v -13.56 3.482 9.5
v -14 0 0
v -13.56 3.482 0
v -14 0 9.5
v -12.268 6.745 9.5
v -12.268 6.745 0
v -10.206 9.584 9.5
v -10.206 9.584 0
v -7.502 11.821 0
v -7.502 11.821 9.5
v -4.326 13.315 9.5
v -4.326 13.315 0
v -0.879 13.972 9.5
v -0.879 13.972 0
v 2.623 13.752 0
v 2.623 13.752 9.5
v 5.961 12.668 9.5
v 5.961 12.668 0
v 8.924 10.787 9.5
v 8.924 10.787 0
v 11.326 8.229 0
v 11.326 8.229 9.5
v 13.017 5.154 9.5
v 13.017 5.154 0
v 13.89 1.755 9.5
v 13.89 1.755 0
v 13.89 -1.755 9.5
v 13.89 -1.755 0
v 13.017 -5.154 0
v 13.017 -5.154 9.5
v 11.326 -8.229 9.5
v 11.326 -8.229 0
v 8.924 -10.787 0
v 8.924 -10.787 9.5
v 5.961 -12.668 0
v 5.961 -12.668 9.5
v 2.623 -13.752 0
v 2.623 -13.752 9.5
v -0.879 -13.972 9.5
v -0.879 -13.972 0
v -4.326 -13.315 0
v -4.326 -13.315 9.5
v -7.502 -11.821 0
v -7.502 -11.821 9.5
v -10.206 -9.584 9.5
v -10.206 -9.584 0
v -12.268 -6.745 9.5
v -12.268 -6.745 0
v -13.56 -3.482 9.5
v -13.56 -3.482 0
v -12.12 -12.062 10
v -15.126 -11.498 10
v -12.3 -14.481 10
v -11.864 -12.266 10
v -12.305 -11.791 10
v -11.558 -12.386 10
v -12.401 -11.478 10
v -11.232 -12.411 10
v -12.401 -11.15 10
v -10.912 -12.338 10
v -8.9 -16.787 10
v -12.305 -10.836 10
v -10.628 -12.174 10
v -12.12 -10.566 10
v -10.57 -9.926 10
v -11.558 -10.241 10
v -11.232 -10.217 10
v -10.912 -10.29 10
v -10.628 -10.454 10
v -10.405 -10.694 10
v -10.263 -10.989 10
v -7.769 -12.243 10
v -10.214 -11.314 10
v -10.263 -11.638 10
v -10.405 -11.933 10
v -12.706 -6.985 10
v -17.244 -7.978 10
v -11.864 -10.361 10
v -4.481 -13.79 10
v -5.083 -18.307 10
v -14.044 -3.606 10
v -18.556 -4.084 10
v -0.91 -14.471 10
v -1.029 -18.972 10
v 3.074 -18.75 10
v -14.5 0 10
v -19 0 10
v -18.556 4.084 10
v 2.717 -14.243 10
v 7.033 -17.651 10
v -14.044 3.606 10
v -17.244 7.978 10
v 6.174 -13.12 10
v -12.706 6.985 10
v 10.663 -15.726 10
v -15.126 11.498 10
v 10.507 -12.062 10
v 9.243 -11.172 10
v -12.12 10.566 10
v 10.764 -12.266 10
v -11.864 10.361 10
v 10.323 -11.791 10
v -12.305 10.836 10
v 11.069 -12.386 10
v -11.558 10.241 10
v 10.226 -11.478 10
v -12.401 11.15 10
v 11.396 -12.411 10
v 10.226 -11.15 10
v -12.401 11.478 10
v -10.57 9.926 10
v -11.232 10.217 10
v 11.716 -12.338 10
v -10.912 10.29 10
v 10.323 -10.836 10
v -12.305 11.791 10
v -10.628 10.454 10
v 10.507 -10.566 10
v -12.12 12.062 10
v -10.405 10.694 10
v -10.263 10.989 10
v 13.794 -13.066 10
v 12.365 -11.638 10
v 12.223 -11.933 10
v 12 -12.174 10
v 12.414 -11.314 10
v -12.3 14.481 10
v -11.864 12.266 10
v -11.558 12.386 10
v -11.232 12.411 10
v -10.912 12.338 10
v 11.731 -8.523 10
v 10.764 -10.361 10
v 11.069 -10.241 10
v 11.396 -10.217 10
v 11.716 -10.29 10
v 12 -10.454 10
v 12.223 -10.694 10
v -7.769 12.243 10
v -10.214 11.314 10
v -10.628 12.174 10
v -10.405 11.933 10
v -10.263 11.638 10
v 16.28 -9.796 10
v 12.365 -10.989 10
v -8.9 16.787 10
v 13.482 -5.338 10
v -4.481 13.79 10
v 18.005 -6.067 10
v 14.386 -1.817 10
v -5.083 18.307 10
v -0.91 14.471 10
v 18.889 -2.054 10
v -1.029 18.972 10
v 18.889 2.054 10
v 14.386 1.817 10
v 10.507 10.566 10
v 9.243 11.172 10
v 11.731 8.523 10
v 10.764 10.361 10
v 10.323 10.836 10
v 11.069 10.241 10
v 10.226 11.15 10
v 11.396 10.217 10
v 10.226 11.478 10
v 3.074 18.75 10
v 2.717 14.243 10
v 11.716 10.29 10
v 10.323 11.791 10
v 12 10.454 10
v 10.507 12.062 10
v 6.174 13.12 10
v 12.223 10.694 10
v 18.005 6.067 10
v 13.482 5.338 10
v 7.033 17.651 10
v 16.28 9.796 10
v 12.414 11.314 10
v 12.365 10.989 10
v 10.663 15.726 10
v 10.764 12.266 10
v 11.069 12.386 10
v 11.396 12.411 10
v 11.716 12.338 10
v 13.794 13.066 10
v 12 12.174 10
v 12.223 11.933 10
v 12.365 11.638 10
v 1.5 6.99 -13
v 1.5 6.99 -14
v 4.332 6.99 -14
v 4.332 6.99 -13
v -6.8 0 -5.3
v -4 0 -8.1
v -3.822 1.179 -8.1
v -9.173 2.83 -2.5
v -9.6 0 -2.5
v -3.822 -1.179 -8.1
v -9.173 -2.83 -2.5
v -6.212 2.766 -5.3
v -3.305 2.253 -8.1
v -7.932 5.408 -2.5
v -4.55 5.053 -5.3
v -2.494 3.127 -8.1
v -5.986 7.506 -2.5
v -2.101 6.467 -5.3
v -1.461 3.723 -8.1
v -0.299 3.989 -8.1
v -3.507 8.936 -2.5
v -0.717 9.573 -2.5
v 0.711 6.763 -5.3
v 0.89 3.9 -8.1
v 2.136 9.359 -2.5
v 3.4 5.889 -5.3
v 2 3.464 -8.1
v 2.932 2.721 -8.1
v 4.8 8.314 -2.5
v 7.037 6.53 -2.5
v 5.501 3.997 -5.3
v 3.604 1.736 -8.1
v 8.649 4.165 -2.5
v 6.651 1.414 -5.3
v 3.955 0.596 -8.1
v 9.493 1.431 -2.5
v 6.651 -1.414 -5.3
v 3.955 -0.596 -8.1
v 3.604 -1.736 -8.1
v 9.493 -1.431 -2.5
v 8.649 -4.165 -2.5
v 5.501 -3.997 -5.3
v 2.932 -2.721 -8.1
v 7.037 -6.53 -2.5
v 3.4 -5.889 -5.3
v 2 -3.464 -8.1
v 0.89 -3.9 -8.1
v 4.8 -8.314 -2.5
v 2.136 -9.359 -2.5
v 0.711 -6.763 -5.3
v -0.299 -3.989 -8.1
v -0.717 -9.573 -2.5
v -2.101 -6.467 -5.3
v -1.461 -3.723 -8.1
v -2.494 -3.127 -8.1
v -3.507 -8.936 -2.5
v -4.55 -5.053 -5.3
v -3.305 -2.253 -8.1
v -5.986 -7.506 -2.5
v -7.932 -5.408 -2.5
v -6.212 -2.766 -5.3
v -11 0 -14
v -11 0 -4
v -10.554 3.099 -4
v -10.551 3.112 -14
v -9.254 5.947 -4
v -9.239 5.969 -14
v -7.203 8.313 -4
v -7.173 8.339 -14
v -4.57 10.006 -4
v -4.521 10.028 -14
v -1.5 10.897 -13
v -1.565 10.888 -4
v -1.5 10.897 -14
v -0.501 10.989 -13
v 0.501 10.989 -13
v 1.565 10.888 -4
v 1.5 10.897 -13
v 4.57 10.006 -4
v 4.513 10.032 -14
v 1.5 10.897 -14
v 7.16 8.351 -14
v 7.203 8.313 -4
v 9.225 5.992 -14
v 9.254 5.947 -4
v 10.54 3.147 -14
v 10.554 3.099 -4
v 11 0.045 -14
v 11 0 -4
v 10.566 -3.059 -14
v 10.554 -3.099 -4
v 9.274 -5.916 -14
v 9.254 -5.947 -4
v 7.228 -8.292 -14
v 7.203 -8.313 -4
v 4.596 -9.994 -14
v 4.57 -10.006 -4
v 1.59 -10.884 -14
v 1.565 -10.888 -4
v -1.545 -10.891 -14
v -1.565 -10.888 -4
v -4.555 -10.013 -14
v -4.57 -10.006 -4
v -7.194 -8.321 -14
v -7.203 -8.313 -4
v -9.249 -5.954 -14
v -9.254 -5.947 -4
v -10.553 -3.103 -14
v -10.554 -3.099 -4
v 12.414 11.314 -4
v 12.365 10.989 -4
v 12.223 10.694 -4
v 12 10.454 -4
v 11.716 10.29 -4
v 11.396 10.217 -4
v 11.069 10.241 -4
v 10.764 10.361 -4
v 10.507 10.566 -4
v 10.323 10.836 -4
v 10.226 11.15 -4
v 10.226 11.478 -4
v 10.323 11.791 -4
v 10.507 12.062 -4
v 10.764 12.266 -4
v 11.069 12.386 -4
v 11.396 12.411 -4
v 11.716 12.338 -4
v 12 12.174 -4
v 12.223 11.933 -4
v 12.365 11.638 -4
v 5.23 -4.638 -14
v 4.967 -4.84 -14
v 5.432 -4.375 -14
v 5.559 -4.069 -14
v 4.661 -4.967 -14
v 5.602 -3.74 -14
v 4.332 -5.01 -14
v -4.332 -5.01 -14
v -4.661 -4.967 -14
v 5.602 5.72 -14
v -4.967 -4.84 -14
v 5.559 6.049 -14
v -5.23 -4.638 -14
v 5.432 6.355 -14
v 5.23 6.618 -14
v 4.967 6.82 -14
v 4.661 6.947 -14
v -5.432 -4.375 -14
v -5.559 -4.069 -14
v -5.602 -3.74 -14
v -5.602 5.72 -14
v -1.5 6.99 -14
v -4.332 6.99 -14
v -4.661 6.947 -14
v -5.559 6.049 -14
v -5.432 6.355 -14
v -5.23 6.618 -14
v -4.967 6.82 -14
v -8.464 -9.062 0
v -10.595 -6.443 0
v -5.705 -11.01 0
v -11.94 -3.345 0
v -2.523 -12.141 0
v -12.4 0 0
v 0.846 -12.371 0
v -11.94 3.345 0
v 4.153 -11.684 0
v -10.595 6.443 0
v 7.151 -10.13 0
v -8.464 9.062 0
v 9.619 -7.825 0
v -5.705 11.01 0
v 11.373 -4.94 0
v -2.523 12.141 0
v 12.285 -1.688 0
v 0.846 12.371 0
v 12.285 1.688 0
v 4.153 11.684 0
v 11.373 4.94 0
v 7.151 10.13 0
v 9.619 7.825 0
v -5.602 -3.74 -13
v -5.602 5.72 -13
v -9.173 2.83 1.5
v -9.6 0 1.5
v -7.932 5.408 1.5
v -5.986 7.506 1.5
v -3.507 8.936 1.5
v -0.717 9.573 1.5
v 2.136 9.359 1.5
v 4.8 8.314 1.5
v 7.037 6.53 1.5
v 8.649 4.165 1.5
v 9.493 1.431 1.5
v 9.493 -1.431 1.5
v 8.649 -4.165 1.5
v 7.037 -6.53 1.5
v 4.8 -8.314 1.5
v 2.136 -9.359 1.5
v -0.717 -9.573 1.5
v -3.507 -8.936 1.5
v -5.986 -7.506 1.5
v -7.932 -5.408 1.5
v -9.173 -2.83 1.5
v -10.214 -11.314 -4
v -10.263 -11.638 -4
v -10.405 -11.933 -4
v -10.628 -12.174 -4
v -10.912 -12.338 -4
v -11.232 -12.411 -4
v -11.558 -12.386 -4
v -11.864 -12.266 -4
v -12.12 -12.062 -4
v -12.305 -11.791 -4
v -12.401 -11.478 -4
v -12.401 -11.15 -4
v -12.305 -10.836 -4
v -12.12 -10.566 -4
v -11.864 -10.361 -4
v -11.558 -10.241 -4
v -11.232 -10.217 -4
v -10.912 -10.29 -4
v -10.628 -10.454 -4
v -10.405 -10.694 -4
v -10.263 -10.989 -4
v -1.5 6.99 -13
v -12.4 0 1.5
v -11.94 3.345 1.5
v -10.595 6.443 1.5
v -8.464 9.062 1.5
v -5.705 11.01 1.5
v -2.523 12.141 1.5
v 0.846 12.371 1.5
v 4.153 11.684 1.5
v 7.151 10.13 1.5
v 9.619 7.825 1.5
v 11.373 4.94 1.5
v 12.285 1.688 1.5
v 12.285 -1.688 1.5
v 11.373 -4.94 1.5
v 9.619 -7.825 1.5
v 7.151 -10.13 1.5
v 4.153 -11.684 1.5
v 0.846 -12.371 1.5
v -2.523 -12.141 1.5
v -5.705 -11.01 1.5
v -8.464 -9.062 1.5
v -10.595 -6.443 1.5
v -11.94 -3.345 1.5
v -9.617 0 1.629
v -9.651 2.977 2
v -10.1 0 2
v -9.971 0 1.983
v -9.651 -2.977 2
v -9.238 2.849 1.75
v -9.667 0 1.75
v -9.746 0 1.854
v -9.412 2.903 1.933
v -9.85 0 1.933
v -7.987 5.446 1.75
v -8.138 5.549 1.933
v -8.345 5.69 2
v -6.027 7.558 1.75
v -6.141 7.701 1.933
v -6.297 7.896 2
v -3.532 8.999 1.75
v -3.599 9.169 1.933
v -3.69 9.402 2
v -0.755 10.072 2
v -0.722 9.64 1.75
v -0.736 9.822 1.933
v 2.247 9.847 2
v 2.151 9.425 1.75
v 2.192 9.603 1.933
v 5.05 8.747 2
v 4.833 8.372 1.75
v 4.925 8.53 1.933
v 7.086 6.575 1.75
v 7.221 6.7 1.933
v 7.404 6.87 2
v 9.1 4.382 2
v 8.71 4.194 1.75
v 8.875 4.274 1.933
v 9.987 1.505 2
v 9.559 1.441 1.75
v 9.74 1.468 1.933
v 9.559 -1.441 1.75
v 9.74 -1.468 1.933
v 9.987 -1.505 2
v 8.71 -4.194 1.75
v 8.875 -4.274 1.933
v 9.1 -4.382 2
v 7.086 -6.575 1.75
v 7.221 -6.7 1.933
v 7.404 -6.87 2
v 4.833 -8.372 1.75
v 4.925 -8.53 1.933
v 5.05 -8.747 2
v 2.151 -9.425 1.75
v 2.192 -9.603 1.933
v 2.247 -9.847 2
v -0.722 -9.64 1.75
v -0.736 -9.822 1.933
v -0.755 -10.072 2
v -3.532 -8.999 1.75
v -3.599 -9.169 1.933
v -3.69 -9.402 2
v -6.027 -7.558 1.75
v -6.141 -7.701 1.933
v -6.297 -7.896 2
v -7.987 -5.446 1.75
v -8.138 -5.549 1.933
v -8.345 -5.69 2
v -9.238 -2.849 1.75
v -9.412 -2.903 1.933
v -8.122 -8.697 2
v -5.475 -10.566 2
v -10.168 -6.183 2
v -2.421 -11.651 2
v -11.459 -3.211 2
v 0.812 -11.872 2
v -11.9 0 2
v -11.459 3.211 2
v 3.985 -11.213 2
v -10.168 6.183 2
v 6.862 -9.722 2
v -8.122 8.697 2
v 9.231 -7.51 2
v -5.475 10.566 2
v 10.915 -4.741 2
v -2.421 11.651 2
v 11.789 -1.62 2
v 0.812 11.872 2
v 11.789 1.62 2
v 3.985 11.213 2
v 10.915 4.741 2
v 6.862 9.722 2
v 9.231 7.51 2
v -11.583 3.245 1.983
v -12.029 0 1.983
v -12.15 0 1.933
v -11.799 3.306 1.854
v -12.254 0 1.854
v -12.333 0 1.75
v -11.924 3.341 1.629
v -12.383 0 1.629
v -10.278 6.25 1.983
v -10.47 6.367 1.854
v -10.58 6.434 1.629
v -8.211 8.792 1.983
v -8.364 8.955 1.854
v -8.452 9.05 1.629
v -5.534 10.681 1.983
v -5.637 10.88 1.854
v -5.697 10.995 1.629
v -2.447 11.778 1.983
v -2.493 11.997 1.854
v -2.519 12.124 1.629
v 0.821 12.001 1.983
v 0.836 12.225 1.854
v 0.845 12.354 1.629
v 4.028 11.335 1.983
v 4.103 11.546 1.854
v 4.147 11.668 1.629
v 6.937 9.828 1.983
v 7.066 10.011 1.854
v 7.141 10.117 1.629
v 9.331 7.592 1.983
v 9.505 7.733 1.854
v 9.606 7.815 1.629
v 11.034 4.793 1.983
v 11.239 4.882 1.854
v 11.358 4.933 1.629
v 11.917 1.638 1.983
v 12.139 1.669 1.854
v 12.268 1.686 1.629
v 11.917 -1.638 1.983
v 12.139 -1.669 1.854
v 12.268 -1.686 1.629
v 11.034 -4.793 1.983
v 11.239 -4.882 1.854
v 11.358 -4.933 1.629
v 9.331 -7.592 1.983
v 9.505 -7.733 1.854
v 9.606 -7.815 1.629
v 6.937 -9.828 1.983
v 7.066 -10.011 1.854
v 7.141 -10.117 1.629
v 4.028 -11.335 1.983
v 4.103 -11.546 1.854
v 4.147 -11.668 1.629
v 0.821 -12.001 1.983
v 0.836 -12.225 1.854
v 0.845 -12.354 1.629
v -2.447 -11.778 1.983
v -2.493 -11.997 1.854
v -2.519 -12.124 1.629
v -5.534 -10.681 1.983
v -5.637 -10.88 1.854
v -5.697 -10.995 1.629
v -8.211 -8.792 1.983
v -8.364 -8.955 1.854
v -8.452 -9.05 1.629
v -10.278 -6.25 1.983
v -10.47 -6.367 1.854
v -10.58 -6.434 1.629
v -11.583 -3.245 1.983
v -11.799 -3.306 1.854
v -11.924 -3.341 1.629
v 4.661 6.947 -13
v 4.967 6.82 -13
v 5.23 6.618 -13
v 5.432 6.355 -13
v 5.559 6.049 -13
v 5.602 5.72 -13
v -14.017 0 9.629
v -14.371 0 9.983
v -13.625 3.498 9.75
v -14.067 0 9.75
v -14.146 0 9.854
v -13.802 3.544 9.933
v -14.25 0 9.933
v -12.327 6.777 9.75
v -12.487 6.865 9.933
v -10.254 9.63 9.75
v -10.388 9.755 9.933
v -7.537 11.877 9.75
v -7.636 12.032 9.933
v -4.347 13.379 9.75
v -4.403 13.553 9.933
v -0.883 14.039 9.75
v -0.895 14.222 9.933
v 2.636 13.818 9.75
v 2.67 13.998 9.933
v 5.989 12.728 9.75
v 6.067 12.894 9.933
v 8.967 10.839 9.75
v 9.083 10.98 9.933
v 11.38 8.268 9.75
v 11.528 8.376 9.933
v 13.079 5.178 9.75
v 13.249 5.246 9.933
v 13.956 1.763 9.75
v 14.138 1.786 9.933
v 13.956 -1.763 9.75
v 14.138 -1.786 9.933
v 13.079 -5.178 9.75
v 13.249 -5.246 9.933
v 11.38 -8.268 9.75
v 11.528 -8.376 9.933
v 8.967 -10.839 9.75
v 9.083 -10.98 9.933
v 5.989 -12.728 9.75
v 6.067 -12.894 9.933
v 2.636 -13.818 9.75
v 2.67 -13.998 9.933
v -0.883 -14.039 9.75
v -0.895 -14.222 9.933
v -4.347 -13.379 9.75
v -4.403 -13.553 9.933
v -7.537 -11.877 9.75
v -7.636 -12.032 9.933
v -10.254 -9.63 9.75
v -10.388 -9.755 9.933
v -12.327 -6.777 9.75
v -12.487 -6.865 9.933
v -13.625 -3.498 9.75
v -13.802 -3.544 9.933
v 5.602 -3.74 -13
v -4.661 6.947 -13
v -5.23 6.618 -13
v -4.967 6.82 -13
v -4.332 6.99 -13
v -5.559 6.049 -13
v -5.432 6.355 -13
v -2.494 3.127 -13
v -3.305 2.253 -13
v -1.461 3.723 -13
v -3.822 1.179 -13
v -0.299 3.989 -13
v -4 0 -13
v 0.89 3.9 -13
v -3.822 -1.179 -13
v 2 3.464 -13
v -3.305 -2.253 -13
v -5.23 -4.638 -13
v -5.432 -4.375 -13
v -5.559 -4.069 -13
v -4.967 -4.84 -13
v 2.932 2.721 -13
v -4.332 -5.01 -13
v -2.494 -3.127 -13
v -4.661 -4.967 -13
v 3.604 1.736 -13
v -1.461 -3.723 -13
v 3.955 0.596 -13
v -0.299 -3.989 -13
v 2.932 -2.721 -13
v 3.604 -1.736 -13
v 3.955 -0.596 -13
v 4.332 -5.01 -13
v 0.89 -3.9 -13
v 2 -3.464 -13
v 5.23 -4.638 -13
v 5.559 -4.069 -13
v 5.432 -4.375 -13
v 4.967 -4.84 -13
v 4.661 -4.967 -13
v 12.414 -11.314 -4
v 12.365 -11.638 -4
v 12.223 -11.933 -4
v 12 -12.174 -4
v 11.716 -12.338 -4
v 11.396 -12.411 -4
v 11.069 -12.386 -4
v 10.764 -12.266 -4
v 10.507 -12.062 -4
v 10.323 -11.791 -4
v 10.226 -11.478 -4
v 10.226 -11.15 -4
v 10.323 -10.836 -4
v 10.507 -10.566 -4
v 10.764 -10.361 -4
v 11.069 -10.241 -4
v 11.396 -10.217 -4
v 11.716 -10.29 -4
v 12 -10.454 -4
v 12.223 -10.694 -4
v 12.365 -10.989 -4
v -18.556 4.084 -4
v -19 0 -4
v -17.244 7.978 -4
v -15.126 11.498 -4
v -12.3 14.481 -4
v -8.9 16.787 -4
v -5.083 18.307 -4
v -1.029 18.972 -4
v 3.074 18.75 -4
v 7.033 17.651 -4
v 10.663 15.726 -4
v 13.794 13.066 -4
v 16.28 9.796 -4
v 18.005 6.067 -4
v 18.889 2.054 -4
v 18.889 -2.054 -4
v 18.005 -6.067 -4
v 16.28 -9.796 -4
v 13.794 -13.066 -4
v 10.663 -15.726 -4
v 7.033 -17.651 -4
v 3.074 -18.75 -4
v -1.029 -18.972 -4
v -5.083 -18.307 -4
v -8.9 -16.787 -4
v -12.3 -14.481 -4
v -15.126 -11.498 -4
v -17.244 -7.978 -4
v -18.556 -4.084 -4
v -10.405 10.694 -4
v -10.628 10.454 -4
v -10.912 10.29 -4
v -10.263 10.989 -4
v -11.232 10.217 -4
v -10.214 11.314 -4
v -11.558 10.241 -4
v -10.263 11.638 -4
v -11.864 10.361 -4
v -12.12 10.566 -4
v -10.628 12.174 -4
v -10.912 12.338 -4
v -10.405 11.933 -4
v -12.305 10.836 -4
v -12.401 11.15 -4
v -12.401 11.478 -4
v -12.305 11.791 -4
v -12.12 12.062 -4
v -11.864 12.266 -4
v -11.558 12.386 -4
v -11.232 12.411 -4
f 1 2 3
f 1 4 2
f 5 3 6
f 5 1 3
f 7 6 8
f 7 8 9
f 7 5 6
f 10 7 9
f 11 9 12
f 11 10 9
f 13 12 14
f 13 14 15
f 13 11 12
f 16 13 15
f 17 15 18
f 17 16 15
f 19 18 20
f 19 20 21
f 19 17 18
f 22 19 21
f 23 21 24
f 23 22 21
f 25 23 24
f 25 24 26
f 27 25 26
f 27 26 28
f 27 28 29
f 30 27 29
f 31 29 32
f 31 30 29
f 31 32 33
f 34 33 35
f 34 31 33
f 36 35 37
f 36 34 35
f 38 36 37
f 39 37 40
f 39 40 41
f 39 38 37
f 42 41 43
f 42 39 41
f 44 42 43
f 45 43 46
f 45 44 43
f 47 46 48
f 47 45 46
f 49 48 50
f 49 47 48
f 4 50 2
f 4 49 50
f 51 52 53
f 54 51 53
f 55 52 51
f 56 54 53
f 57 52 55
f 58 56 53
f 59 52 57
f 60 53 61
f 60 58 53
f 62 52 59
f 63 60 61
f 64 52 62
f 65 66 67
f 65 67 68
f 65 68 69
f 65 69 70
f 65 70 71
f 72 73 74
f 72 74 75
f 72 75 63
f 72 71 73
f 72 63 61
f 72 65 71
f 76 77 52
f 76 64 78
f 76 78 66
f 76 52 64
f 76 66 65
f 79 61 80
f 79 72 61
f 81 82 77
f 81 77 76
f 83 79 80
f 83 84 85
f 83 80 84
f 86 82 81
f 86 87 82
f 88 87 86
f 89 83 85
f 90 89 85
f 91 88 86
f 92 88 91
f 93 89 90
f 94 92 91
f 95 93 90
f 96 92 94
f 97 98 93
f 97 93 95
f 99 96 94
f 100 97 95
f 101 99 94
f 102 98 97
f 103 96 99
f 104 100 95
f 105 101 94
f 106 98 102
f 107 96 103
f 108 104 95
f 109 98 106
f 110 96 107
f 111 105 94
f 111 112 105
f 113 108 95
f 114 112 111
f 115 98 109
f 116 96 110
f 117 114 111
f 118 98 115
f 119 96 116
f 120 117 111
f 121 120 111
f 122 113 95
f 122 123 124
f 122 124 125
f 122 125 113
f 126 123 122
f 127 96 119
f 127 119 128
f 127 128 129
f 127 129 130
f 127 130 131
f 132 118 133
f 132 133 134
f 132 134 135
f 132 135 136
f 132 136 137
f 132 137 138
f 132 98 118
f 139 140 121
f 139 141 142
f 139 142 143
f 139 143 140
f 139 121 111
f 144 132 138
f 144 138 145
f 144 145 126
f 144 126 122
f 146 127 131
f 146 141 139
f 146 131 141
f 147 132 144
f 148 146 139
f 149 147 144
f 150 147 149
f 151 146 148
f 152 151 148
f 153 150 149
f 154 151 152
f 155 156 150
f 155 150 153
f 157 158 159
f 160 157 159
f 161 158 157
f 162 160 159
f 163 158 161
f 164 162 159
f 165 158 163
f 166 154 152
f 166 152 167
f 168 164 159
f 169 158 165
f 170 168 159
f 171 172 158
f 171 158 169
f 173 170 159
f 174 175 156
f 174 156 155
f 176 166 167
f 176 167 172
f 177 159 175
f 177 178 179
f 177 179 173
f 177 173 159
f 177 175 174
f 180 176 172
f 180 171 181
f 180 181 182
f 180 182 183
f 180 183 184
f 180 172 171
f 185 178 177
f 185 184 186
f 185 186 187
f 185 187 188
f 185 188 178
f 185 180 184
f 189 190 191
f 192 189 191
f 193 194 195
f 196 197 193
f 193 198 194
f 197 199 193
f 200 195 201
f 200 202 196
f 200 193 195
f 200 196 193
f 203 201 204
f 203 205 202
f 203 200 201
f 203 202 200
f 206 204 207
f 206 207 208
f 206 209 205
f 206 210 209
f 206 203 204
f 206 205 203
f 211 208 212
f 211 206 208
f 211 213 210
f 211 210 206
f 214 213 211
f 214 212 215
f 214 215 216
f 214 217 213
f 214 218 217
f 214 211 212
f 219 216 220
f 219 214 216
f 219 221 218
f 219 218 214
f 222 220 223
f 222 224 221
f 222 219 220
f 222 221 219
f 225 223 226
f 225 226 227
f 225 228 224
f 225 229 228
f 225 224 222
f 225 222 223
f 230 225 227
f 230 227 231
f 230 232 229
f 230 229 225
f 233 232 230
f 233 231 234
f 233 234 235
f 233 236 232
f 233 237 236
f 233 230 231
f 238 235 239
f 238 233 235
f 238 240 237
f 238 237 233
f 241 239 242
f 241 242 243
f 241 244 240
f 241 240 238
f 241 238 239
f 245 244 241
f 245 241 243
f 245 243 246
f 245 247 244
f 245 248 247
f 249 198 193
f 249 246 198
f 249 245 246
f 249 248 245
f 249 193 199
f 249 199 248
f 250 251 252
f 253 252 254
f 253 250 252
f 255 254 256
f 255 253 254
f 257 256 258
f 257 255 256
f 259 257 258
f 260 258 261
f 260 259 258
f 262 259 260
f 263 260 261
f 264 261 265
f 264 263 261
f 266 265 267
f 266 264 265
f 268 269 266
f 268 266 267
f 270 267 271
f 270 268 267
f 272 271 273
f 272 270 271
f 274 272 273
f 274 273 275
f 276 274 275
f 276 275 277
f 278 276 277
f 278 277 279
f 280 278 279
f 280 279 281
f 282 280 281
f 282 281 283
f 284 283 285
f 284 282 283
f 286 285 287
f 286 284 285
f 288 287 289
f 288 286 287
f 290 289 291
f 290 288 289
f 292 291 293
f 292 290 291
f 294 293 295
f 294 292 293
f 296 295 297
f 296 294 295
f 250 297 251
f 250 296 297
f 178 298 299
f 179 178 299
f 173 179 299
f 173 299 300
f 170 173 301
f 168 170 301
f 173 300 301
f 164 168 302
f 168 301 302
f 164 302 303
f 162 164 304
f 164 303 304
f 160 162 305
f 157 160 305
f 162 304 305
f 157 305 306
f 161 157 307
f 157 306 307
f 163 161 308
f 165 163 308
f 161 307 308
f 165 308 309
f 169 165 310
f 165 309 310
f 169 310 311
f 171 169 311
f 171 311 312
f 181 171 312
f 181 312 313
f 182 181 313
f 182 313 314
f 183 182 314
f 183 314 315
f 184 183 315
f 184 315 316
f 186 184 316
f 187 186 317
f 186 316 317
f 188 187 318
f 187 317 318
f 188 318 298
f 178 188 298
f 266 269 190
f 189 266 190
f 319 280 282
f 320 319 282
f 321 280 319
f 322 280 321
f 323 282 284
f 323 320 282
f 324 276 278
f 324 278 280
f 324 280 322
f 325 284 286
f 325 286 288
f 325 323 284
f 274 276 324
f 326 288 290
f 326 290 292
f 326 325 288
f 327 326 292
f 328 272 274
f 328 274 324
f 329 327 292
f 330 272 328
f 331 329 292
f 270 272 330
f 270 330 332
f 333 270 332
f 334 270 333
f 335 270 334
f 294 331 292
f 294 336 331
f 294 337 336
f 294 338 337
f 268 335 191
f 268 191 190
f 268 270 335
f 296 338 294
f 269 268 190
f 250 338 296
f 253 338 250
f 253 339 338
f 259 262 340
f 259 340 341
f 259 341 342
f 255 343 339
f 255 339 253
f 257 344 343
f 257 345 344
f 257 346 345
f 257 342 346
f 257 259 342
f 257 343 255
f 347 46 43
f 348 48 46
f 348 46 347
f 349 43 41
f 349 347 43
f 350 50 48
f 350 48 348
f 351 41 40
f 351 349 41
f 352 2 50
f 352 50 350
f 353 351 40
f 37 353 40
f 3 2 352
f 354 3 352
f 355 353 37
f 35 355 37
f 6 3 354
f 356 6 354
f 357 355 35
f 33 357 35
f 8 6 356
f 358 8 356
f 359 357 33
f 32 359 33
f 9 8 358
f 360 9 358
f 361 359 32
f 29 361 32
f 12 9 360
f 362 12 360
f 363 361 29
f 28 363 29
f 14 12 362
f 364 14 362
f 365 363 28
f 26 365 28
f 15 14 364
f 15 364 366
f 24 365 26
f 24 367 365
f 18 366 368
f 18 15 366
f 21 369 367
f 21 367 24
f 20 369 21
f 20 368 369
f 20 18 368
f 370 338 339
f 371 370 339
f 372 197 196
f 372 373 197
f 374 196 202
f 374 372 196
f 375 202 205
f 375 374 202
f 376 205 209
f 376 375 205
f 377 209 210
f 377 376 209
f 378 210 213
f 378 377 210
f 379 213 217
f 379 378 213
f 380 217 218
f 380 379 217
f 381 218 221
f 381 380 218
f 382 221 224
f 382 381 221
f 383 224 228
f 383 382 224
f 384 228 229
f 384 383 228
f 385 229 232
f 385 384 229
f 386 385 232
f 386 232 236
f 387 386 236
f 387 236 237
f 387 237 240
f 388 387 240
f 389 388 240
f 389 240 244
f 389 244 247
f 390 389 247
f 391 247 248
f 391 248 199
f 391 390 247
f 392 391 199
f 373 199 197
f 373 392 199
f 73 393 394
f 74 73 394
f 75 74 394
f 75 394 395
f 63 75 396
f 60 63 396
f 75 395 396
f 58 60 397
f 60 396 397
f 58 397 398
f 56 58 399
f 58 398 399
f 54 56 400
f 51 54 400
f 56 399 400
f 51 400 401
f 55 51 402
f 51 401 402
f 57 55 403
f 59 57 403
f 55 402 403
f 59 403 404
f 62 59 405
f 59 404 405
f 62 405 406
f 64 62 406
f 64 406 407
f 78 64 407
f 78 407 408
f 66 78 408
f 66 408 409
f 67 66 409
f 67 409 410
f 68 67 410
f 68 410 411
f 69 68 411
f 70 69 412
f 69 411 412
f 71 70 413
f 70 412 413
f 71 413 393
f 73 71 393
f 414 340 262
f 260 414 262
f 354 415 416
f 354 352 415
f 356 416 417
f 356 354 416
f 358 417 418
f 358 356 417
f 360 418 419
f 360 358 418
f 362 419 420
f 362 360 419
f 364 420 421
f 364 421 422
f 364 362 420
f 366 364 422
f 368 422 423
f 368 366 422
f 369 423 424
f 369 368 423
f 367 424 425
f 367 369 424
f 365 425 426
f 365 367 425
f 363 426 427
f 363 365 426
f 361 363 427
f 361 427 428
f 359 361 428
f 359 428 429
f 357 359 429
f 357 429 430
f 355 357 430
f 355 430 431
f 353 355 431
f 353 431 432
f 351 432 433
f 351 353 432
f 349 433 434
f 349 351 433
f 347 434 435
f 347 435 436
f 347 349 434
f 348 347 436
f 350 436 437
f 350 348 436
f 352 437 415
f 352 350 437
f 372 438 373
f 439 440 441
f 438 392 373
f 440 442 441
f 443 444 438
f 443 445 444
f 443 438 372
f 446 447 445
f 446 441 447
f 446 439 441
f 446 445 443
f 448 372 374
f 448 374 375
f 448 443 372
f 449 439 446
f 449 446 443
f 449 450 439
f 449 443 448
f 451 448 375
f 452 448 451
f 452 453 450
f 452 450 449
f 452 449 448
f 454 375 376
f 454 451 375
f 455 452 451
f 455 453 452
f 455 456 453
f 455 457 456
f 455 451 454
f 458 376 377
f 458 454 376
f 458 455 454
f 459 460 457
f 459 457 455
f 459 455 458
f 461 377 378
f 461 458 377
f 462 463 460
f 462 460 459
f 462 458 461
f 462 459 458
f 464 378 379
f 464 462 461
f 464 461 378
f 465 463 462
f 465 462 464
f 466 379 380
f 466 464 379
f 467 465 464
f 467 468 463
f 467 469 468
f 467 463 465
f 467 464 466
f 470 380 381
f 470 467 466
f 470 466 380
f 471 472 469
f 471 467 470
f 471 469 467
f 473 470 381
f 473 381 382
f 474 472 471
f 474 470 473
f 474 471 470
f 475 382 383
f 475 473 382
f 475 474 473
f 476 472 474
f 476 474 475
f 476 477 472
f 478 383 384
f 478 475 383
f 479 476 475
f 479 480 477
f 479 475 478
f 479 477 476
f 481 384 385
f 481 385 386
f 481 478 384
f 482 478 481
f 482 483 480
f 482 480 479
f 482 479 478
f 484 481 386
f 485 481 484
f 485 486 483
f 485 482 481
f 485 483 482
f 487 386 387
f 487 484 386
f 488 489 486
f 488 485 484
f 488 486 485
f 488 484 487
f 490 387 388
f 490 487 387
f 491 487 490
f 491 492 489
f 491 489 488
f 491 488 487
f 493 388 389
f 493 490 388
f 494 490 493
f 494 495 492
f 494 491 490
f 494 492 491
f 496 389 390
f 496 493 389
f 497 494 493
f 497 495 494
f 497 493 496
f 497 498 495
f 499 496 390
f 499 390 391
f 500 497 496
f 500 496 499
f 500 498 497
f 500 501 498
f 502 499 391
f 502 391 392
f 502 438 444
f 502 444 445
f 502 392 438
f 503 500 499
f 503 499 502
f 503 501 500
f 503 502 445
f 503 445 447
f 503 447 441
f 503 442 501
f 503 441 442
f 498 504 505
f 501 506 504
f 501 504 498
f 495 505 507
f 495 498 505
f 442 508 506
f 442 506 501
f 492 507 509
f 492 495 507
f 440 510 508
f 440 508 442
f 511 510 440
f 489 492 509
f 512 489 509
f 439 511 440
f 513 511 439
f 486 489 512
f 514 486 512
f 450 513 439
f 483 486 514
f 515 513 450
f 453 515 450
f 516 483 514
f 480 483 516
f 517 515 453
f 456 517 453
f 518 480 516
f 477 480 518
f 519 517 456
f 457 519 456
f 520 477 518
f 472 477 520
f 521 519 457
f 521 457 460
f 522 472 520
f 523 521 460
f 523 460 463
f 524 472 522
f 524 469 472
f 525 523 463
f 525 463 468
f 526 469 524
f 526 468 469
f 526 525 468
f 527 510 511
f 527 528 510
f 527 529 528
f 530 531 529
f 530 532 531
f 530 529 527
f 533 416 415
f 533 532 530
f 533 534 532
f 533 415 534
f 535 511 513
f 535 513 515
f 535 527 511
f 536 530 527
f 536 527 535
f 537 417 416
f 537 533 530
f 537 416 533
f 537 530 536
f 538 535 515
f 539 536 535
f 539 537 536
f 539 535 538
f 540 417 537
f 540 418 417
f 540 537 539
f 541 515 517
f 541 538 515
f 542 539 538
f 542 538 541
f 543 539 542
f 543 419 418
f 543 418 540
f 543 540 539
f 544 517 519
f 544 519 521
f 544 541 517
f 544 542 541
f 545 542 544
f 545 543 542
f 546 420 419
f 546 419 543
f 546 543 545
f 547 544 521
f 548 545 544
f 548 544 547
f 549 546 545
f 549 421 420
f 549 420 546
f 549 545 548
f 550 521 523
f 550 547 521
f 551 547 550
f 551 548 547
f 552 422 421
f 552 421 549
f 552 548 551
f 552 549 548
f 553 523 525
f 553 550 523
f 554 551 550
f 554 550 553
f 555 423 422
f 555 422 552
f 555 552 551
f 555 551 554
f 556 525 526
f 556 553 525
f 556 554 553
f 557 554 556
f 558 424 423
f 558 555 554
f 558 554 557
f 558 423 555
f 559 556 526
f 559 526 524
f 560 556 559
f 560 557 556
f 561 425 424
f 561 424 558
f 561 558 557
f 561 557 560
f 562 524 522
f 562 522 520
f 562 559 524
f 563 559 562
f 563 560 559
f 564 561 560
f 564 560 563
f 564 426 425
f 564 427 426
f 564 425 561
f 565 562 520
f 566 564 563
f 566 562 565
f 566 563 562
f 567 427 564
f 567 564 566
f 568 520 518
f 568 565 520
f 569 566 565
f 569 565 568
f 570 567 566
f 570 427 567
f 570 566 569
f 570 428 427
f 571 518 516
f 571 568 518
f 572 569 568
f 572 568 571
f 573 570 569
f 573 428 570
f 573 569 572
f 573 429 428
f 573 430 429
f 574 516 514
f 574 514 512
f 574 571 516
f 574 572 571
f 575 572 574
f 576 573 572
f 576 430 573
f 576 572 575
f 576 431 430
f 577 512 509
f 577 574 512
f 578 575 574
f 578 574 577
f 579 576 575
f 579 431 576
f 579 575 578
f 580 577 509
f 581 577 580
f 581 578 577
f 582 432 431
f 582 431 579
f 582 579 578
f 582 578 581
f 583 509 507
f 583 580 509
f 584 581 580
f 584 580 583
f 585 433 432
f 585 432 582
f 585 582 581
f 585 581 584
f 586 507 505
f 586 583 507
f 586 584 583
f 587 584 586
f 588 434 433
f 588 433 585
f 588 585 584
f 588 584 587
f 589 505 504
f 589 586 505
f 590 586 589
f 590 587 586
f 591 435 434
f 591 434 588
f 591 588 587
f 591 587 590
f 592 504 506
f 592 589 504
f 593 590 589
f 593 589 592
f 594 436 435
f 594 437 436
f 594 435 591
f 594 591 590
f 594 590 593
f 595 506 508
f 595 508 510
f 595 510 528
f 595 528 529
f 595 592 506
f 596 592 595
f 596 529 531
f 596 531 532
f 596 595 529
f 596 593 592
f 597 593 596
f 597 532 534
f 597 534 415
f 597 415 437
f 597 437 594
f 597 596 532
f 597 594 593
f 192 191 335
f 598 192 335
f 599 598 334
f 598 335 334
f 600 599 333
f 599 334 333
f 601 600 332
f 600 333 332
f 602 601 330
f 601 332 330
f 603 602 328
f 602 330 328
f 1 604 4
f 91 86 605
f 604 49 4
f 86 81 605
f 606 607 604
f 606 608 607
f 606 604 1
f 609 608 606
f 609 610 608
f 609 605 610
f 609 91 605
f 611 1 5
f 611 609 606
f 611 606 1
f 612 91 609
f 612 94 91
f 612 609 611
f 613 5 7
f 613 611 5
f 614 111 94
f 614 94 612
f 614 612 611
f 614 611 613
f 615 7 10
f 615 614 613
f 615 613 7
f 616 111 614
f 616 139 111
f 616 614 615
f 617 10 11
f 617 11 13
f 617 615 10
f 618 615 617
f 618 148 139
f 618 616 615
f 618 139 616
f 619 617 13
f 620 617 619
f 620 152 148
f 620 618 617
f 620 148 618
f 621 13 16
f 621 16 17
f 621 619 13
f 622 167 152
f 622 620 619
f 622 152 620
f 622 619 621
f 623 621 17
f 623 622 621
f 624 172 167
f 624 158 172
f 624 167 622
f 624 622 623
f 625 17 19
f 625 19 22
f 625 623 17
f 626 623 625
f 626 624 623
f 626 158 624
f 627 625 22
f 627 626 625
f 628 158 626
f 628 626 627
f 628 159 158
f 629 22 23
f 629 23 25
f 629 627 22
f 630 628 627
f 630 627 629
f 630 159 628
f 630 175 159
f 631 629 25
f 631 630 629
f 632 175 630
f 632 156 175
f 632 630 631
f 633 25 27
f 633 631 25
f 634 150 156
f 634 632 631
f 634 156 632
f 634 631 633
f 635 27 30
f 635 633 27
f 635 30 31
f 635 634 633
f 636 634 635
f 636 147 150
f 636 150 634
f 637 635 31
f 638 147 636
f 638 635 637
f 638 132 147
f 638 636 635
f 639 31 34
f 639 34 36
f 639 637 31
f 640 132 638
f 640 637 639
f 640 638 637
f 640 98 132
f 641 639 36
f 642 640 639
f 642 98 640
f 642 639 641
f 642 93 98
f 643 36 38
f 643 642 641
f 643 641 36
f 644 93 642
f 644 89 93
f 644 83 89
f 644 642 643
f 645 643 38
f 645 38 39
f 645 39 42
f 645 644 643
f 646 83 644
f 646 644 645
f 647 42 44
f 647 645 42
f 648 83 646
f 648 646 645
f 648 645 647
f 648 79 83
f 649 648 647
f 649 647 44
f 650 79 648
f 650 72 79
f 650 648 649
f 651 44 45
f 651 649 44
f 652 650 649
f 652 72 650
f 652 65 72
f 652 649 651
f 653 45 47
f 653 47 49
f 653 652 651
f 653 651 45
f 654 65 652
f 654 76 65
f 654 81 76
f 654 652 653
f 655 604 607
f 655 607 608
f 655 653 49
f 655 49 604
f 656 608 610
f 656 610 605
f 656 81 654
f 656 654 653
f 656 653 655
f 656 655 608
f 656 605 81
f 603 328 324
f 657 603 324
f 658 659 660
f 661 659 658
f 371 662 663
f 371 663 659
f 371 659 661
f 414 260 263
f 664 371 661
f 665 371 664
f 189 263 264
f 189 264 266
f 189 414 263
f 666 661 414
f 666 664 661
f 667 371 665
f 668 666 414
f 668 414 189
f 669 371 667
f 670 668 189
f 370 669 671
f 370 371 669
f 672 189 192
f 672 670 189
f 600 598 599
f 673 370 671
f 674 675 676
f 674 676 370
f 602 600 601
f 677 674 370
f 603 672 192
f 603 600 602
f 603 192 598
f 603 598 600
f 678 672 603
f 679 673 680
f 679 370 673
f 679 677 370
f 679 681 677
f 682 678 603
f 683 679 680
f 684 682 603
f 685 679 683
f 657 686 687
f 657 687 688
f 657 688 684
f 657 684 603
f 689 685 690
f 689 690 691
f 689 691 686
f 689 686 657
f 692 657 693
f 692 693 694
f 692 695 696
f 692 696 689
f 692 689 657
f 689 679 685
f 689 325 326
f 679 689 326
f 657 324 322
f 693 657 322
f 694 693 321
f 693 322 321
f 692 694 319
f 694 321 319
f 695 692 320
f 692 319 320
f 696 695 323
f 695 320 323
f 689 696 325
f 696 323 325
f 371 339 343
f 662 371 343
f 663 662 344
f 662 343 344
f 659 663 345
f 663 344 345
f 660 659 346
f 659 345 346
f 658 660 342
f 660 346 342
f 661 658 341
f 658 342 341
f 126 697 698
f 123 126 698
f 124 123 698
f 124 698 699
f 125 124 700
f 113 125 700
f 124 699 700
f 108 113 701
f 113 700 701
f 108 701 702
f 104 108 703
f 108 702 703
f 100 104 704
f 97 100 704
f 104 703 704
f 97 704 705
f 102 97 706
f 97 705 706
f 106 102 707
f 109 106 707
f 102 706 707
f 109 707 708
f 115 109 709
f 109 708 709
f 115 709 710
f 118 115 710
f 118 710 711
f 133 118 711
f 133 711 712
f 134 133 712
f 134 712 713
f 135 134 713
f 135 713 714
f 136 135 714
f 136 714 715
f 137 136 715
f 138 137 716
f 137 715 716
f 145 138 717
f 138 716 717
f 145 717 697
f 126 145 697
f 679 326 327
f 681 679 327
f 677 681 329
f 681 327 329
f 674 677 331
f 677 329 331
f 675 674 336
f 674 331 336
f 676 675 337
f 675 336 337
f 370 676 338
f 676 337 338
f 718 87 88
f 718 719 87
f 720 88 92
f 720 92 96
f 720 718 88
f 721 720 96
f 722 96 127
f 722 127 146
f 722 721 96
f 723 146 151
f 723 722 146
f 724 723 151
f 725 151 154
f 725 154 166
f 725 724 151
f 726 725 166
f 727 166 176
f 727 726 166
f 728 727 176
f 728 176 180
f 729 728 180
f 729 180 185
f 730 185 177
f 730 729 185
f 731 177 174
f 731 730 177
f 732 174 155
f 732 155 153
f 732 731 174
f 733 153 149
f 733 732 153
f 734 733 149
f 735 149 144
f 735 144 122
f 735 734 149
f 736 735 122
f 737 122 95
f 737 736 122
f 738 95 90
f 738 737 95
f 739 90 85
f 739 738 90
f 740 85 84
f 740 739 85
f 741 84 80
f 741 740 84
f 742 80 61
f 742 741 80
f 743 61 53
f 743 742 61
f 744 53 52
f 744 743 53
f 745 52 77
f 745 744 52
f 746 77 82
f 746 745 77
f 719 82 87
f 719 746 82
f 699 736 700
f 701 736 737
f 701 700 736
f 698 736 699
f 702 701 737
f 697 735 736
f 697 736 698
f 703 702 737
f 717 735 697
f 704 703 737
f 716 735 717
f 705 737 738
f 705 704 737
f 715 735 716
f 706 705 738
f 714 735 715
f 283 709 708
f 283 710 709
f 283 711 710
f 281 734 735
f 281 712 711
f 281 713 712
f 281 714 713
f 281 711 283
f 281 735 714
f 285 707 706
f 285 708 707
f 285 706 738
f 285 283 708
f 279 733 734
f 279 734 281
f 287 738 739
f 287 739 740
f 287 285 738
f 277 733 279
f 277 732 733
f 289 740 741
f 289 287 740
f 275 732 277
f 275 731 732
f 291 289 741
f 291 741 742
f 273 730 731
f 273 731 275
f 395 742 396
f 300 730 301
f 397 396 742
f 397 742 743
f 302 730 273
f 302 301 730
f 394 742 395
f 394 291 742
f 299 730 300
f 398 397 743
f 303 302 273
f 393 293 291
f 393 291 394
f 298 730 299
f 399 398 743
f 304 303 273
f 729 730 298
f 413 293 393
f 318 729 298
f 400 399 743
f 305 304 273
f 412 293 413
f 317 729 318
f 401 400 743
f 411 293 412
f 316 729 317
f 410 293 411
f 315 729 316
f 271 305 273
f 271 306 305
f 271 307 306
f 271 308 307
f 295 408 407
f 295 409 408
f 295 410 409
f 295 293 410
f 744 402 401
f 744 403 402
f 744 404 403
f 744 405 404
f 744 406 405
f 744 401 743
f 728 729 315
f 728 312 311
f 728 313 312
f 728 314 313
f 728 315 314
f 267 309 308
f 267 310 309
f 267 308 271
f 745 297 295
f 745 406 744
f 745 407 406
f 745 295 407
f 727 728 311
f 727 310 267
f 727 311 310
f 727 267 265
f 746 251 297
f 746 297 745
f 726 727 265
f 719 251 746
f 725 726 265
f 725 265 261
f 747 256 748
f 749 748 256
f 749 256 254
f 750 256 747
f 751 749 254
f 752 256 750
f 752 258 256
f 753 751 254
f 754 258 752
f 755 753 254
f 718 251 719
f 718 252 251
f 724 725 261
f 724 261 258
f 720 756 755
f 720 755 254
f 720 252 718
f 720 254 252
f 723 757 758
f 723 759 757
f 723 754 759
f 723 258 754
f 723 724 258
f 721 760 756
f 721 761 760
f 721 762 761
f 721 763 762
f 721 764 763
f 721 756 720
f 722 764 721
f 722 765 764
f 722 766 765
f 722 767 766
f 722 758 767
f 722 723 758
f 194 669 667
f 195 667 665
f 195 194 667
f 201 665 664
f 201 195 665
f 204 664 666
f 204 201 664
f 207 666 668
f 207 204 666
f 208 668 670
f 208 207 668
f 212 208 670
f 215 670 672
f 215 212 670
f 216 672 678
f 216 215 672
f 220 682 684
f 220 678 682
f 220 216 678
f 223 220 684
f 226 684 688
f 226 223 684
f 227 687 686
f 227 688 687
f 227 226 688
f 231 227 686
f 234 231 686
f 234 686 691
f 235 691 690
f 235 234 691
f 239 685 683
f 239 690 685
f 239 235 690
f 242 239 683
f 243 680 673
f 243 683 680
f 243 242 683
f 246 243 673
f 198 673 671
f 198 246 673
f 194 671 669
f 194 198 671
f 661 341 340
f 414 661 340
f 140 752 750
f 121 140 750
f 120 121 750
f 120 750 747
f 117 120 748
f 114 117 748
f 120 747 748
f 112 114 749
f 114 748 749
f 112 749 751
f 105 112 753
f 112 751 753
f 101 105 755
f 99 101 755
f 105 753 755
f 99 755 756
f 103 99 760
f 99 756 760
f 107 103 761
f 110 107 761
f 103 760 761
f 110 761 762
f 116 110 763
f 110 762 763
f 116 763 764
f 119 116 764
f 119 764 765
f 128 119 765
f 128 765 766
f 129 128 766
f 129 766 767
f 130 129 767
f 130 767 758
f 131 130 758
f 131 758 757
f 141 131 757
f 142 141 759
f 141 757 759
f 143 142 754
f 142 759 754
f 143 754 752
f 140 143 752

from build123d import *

# Parameters (mm, degrees)
F2_R     = 1.1
F3_DEPTH = 14
F5_DEPTH = 1


with BuildPart() as f1:
    # F0 (on Front) → F1 (revolve)
    with BuildSketch(Plane.XZ):
        with BuildLine():
            Line((-14, 0), (-14, 9.5))
            ThreePointArc((-14, 9.5), (-14.146447, 9.853553), (-14.5, 10))
            Line((-14.5, 10), (-19, 10))
            Line((-19, 10), (-19, -4))
            Line((-19, -4), (-11, -4))
            Line((-11, -4), (-11, -14))
            Line((-11, -14), (-4, -14))
            Line((-4, -14), (-4, -8.1))
            Line((-4, -8.1), (-9.6, -2.5))
            Line((-9.6, -2.5), (-9.6, 1.5))
            ThreePointArc((-9.6, 1.5), (-9.746447, 1.853553), (-10.1, 2))
            Line((-10.1, 2), (-11.9, 2))
            ThreePointArc((-11.9, 2), (-12.253553, 1.853553), (-12.4, 1.5))
            Line((-12.4, 1.5), (-12.4, 0))
            Line((-12.4, 0), (-14, 0))
        make_face()
    revolve(axis=Axis((0, 0, -7), (0, 0, -1)))

    # F2 (on face) → F3 (cut, through all)
    with BuildSketch(Plane(origin=(0, 0, -4), x_dir=(1, 0, 0), z_dir=(0, 0, -1))):
        with Locations((11.313708, 11.313708)):
            Circle(F2_R)
        with Locations((-11.313708, -11.313708)):
            Circle(F2_R)
        with Locations((11.313708, -11.313708)):
            Circle(F2_R)
        with Locations((-11.313708, 11.313708)):
            Circle(F2_R)
    extrude(amount=-F3_DEPTH, mode=Mode.SUBTRACT)

    # F4 (on face) → F5 (cut)
    with BuildSketch(Plane(origin=(0, 0, -14), x_dir=(1, 0, 0), z_dir=(0, 0, -1))):
        with BuildLine():
            Line((4.332, 5.01), (-4.332, 5.01))
            ThreePointArc((-4.332, 5.01), (-5.230026, 4.638026), (-5.602, 3.74))
            Line((-5.602, 3.74), (-5.602, -5.72))
            ThreePointArc((-5.602, -5.72), (-5.230026, -6.618026), (-4.332, -6.99))
            Line((-4.332, -6.99), (-1.5, -6.99))
            Line((-1.5, -6.99), (-1.5, -11.99))
            ThreePointArc((-1.5, -11.99), (0, -13.49), (1.5, -11.99))
            Line((1.5, -11.99), (1.5, -6.99))
            Line((1.5, -6.99), (4.332, -6.99))
            ThreePointArc((4.332, -6.99), (5.230026, -6.618026), (5.602, -5.72))
            Line((5.602, -5.72), (5.602, 3.74))
            ThreePointArc((5.602, 3.74), (5.230026, 4.638026), (4.332, 5.01))
        make_face()
    extrude(amount=-F5_DEPTH, mode=Mode.SUBTRACT)


solid = f1.part
